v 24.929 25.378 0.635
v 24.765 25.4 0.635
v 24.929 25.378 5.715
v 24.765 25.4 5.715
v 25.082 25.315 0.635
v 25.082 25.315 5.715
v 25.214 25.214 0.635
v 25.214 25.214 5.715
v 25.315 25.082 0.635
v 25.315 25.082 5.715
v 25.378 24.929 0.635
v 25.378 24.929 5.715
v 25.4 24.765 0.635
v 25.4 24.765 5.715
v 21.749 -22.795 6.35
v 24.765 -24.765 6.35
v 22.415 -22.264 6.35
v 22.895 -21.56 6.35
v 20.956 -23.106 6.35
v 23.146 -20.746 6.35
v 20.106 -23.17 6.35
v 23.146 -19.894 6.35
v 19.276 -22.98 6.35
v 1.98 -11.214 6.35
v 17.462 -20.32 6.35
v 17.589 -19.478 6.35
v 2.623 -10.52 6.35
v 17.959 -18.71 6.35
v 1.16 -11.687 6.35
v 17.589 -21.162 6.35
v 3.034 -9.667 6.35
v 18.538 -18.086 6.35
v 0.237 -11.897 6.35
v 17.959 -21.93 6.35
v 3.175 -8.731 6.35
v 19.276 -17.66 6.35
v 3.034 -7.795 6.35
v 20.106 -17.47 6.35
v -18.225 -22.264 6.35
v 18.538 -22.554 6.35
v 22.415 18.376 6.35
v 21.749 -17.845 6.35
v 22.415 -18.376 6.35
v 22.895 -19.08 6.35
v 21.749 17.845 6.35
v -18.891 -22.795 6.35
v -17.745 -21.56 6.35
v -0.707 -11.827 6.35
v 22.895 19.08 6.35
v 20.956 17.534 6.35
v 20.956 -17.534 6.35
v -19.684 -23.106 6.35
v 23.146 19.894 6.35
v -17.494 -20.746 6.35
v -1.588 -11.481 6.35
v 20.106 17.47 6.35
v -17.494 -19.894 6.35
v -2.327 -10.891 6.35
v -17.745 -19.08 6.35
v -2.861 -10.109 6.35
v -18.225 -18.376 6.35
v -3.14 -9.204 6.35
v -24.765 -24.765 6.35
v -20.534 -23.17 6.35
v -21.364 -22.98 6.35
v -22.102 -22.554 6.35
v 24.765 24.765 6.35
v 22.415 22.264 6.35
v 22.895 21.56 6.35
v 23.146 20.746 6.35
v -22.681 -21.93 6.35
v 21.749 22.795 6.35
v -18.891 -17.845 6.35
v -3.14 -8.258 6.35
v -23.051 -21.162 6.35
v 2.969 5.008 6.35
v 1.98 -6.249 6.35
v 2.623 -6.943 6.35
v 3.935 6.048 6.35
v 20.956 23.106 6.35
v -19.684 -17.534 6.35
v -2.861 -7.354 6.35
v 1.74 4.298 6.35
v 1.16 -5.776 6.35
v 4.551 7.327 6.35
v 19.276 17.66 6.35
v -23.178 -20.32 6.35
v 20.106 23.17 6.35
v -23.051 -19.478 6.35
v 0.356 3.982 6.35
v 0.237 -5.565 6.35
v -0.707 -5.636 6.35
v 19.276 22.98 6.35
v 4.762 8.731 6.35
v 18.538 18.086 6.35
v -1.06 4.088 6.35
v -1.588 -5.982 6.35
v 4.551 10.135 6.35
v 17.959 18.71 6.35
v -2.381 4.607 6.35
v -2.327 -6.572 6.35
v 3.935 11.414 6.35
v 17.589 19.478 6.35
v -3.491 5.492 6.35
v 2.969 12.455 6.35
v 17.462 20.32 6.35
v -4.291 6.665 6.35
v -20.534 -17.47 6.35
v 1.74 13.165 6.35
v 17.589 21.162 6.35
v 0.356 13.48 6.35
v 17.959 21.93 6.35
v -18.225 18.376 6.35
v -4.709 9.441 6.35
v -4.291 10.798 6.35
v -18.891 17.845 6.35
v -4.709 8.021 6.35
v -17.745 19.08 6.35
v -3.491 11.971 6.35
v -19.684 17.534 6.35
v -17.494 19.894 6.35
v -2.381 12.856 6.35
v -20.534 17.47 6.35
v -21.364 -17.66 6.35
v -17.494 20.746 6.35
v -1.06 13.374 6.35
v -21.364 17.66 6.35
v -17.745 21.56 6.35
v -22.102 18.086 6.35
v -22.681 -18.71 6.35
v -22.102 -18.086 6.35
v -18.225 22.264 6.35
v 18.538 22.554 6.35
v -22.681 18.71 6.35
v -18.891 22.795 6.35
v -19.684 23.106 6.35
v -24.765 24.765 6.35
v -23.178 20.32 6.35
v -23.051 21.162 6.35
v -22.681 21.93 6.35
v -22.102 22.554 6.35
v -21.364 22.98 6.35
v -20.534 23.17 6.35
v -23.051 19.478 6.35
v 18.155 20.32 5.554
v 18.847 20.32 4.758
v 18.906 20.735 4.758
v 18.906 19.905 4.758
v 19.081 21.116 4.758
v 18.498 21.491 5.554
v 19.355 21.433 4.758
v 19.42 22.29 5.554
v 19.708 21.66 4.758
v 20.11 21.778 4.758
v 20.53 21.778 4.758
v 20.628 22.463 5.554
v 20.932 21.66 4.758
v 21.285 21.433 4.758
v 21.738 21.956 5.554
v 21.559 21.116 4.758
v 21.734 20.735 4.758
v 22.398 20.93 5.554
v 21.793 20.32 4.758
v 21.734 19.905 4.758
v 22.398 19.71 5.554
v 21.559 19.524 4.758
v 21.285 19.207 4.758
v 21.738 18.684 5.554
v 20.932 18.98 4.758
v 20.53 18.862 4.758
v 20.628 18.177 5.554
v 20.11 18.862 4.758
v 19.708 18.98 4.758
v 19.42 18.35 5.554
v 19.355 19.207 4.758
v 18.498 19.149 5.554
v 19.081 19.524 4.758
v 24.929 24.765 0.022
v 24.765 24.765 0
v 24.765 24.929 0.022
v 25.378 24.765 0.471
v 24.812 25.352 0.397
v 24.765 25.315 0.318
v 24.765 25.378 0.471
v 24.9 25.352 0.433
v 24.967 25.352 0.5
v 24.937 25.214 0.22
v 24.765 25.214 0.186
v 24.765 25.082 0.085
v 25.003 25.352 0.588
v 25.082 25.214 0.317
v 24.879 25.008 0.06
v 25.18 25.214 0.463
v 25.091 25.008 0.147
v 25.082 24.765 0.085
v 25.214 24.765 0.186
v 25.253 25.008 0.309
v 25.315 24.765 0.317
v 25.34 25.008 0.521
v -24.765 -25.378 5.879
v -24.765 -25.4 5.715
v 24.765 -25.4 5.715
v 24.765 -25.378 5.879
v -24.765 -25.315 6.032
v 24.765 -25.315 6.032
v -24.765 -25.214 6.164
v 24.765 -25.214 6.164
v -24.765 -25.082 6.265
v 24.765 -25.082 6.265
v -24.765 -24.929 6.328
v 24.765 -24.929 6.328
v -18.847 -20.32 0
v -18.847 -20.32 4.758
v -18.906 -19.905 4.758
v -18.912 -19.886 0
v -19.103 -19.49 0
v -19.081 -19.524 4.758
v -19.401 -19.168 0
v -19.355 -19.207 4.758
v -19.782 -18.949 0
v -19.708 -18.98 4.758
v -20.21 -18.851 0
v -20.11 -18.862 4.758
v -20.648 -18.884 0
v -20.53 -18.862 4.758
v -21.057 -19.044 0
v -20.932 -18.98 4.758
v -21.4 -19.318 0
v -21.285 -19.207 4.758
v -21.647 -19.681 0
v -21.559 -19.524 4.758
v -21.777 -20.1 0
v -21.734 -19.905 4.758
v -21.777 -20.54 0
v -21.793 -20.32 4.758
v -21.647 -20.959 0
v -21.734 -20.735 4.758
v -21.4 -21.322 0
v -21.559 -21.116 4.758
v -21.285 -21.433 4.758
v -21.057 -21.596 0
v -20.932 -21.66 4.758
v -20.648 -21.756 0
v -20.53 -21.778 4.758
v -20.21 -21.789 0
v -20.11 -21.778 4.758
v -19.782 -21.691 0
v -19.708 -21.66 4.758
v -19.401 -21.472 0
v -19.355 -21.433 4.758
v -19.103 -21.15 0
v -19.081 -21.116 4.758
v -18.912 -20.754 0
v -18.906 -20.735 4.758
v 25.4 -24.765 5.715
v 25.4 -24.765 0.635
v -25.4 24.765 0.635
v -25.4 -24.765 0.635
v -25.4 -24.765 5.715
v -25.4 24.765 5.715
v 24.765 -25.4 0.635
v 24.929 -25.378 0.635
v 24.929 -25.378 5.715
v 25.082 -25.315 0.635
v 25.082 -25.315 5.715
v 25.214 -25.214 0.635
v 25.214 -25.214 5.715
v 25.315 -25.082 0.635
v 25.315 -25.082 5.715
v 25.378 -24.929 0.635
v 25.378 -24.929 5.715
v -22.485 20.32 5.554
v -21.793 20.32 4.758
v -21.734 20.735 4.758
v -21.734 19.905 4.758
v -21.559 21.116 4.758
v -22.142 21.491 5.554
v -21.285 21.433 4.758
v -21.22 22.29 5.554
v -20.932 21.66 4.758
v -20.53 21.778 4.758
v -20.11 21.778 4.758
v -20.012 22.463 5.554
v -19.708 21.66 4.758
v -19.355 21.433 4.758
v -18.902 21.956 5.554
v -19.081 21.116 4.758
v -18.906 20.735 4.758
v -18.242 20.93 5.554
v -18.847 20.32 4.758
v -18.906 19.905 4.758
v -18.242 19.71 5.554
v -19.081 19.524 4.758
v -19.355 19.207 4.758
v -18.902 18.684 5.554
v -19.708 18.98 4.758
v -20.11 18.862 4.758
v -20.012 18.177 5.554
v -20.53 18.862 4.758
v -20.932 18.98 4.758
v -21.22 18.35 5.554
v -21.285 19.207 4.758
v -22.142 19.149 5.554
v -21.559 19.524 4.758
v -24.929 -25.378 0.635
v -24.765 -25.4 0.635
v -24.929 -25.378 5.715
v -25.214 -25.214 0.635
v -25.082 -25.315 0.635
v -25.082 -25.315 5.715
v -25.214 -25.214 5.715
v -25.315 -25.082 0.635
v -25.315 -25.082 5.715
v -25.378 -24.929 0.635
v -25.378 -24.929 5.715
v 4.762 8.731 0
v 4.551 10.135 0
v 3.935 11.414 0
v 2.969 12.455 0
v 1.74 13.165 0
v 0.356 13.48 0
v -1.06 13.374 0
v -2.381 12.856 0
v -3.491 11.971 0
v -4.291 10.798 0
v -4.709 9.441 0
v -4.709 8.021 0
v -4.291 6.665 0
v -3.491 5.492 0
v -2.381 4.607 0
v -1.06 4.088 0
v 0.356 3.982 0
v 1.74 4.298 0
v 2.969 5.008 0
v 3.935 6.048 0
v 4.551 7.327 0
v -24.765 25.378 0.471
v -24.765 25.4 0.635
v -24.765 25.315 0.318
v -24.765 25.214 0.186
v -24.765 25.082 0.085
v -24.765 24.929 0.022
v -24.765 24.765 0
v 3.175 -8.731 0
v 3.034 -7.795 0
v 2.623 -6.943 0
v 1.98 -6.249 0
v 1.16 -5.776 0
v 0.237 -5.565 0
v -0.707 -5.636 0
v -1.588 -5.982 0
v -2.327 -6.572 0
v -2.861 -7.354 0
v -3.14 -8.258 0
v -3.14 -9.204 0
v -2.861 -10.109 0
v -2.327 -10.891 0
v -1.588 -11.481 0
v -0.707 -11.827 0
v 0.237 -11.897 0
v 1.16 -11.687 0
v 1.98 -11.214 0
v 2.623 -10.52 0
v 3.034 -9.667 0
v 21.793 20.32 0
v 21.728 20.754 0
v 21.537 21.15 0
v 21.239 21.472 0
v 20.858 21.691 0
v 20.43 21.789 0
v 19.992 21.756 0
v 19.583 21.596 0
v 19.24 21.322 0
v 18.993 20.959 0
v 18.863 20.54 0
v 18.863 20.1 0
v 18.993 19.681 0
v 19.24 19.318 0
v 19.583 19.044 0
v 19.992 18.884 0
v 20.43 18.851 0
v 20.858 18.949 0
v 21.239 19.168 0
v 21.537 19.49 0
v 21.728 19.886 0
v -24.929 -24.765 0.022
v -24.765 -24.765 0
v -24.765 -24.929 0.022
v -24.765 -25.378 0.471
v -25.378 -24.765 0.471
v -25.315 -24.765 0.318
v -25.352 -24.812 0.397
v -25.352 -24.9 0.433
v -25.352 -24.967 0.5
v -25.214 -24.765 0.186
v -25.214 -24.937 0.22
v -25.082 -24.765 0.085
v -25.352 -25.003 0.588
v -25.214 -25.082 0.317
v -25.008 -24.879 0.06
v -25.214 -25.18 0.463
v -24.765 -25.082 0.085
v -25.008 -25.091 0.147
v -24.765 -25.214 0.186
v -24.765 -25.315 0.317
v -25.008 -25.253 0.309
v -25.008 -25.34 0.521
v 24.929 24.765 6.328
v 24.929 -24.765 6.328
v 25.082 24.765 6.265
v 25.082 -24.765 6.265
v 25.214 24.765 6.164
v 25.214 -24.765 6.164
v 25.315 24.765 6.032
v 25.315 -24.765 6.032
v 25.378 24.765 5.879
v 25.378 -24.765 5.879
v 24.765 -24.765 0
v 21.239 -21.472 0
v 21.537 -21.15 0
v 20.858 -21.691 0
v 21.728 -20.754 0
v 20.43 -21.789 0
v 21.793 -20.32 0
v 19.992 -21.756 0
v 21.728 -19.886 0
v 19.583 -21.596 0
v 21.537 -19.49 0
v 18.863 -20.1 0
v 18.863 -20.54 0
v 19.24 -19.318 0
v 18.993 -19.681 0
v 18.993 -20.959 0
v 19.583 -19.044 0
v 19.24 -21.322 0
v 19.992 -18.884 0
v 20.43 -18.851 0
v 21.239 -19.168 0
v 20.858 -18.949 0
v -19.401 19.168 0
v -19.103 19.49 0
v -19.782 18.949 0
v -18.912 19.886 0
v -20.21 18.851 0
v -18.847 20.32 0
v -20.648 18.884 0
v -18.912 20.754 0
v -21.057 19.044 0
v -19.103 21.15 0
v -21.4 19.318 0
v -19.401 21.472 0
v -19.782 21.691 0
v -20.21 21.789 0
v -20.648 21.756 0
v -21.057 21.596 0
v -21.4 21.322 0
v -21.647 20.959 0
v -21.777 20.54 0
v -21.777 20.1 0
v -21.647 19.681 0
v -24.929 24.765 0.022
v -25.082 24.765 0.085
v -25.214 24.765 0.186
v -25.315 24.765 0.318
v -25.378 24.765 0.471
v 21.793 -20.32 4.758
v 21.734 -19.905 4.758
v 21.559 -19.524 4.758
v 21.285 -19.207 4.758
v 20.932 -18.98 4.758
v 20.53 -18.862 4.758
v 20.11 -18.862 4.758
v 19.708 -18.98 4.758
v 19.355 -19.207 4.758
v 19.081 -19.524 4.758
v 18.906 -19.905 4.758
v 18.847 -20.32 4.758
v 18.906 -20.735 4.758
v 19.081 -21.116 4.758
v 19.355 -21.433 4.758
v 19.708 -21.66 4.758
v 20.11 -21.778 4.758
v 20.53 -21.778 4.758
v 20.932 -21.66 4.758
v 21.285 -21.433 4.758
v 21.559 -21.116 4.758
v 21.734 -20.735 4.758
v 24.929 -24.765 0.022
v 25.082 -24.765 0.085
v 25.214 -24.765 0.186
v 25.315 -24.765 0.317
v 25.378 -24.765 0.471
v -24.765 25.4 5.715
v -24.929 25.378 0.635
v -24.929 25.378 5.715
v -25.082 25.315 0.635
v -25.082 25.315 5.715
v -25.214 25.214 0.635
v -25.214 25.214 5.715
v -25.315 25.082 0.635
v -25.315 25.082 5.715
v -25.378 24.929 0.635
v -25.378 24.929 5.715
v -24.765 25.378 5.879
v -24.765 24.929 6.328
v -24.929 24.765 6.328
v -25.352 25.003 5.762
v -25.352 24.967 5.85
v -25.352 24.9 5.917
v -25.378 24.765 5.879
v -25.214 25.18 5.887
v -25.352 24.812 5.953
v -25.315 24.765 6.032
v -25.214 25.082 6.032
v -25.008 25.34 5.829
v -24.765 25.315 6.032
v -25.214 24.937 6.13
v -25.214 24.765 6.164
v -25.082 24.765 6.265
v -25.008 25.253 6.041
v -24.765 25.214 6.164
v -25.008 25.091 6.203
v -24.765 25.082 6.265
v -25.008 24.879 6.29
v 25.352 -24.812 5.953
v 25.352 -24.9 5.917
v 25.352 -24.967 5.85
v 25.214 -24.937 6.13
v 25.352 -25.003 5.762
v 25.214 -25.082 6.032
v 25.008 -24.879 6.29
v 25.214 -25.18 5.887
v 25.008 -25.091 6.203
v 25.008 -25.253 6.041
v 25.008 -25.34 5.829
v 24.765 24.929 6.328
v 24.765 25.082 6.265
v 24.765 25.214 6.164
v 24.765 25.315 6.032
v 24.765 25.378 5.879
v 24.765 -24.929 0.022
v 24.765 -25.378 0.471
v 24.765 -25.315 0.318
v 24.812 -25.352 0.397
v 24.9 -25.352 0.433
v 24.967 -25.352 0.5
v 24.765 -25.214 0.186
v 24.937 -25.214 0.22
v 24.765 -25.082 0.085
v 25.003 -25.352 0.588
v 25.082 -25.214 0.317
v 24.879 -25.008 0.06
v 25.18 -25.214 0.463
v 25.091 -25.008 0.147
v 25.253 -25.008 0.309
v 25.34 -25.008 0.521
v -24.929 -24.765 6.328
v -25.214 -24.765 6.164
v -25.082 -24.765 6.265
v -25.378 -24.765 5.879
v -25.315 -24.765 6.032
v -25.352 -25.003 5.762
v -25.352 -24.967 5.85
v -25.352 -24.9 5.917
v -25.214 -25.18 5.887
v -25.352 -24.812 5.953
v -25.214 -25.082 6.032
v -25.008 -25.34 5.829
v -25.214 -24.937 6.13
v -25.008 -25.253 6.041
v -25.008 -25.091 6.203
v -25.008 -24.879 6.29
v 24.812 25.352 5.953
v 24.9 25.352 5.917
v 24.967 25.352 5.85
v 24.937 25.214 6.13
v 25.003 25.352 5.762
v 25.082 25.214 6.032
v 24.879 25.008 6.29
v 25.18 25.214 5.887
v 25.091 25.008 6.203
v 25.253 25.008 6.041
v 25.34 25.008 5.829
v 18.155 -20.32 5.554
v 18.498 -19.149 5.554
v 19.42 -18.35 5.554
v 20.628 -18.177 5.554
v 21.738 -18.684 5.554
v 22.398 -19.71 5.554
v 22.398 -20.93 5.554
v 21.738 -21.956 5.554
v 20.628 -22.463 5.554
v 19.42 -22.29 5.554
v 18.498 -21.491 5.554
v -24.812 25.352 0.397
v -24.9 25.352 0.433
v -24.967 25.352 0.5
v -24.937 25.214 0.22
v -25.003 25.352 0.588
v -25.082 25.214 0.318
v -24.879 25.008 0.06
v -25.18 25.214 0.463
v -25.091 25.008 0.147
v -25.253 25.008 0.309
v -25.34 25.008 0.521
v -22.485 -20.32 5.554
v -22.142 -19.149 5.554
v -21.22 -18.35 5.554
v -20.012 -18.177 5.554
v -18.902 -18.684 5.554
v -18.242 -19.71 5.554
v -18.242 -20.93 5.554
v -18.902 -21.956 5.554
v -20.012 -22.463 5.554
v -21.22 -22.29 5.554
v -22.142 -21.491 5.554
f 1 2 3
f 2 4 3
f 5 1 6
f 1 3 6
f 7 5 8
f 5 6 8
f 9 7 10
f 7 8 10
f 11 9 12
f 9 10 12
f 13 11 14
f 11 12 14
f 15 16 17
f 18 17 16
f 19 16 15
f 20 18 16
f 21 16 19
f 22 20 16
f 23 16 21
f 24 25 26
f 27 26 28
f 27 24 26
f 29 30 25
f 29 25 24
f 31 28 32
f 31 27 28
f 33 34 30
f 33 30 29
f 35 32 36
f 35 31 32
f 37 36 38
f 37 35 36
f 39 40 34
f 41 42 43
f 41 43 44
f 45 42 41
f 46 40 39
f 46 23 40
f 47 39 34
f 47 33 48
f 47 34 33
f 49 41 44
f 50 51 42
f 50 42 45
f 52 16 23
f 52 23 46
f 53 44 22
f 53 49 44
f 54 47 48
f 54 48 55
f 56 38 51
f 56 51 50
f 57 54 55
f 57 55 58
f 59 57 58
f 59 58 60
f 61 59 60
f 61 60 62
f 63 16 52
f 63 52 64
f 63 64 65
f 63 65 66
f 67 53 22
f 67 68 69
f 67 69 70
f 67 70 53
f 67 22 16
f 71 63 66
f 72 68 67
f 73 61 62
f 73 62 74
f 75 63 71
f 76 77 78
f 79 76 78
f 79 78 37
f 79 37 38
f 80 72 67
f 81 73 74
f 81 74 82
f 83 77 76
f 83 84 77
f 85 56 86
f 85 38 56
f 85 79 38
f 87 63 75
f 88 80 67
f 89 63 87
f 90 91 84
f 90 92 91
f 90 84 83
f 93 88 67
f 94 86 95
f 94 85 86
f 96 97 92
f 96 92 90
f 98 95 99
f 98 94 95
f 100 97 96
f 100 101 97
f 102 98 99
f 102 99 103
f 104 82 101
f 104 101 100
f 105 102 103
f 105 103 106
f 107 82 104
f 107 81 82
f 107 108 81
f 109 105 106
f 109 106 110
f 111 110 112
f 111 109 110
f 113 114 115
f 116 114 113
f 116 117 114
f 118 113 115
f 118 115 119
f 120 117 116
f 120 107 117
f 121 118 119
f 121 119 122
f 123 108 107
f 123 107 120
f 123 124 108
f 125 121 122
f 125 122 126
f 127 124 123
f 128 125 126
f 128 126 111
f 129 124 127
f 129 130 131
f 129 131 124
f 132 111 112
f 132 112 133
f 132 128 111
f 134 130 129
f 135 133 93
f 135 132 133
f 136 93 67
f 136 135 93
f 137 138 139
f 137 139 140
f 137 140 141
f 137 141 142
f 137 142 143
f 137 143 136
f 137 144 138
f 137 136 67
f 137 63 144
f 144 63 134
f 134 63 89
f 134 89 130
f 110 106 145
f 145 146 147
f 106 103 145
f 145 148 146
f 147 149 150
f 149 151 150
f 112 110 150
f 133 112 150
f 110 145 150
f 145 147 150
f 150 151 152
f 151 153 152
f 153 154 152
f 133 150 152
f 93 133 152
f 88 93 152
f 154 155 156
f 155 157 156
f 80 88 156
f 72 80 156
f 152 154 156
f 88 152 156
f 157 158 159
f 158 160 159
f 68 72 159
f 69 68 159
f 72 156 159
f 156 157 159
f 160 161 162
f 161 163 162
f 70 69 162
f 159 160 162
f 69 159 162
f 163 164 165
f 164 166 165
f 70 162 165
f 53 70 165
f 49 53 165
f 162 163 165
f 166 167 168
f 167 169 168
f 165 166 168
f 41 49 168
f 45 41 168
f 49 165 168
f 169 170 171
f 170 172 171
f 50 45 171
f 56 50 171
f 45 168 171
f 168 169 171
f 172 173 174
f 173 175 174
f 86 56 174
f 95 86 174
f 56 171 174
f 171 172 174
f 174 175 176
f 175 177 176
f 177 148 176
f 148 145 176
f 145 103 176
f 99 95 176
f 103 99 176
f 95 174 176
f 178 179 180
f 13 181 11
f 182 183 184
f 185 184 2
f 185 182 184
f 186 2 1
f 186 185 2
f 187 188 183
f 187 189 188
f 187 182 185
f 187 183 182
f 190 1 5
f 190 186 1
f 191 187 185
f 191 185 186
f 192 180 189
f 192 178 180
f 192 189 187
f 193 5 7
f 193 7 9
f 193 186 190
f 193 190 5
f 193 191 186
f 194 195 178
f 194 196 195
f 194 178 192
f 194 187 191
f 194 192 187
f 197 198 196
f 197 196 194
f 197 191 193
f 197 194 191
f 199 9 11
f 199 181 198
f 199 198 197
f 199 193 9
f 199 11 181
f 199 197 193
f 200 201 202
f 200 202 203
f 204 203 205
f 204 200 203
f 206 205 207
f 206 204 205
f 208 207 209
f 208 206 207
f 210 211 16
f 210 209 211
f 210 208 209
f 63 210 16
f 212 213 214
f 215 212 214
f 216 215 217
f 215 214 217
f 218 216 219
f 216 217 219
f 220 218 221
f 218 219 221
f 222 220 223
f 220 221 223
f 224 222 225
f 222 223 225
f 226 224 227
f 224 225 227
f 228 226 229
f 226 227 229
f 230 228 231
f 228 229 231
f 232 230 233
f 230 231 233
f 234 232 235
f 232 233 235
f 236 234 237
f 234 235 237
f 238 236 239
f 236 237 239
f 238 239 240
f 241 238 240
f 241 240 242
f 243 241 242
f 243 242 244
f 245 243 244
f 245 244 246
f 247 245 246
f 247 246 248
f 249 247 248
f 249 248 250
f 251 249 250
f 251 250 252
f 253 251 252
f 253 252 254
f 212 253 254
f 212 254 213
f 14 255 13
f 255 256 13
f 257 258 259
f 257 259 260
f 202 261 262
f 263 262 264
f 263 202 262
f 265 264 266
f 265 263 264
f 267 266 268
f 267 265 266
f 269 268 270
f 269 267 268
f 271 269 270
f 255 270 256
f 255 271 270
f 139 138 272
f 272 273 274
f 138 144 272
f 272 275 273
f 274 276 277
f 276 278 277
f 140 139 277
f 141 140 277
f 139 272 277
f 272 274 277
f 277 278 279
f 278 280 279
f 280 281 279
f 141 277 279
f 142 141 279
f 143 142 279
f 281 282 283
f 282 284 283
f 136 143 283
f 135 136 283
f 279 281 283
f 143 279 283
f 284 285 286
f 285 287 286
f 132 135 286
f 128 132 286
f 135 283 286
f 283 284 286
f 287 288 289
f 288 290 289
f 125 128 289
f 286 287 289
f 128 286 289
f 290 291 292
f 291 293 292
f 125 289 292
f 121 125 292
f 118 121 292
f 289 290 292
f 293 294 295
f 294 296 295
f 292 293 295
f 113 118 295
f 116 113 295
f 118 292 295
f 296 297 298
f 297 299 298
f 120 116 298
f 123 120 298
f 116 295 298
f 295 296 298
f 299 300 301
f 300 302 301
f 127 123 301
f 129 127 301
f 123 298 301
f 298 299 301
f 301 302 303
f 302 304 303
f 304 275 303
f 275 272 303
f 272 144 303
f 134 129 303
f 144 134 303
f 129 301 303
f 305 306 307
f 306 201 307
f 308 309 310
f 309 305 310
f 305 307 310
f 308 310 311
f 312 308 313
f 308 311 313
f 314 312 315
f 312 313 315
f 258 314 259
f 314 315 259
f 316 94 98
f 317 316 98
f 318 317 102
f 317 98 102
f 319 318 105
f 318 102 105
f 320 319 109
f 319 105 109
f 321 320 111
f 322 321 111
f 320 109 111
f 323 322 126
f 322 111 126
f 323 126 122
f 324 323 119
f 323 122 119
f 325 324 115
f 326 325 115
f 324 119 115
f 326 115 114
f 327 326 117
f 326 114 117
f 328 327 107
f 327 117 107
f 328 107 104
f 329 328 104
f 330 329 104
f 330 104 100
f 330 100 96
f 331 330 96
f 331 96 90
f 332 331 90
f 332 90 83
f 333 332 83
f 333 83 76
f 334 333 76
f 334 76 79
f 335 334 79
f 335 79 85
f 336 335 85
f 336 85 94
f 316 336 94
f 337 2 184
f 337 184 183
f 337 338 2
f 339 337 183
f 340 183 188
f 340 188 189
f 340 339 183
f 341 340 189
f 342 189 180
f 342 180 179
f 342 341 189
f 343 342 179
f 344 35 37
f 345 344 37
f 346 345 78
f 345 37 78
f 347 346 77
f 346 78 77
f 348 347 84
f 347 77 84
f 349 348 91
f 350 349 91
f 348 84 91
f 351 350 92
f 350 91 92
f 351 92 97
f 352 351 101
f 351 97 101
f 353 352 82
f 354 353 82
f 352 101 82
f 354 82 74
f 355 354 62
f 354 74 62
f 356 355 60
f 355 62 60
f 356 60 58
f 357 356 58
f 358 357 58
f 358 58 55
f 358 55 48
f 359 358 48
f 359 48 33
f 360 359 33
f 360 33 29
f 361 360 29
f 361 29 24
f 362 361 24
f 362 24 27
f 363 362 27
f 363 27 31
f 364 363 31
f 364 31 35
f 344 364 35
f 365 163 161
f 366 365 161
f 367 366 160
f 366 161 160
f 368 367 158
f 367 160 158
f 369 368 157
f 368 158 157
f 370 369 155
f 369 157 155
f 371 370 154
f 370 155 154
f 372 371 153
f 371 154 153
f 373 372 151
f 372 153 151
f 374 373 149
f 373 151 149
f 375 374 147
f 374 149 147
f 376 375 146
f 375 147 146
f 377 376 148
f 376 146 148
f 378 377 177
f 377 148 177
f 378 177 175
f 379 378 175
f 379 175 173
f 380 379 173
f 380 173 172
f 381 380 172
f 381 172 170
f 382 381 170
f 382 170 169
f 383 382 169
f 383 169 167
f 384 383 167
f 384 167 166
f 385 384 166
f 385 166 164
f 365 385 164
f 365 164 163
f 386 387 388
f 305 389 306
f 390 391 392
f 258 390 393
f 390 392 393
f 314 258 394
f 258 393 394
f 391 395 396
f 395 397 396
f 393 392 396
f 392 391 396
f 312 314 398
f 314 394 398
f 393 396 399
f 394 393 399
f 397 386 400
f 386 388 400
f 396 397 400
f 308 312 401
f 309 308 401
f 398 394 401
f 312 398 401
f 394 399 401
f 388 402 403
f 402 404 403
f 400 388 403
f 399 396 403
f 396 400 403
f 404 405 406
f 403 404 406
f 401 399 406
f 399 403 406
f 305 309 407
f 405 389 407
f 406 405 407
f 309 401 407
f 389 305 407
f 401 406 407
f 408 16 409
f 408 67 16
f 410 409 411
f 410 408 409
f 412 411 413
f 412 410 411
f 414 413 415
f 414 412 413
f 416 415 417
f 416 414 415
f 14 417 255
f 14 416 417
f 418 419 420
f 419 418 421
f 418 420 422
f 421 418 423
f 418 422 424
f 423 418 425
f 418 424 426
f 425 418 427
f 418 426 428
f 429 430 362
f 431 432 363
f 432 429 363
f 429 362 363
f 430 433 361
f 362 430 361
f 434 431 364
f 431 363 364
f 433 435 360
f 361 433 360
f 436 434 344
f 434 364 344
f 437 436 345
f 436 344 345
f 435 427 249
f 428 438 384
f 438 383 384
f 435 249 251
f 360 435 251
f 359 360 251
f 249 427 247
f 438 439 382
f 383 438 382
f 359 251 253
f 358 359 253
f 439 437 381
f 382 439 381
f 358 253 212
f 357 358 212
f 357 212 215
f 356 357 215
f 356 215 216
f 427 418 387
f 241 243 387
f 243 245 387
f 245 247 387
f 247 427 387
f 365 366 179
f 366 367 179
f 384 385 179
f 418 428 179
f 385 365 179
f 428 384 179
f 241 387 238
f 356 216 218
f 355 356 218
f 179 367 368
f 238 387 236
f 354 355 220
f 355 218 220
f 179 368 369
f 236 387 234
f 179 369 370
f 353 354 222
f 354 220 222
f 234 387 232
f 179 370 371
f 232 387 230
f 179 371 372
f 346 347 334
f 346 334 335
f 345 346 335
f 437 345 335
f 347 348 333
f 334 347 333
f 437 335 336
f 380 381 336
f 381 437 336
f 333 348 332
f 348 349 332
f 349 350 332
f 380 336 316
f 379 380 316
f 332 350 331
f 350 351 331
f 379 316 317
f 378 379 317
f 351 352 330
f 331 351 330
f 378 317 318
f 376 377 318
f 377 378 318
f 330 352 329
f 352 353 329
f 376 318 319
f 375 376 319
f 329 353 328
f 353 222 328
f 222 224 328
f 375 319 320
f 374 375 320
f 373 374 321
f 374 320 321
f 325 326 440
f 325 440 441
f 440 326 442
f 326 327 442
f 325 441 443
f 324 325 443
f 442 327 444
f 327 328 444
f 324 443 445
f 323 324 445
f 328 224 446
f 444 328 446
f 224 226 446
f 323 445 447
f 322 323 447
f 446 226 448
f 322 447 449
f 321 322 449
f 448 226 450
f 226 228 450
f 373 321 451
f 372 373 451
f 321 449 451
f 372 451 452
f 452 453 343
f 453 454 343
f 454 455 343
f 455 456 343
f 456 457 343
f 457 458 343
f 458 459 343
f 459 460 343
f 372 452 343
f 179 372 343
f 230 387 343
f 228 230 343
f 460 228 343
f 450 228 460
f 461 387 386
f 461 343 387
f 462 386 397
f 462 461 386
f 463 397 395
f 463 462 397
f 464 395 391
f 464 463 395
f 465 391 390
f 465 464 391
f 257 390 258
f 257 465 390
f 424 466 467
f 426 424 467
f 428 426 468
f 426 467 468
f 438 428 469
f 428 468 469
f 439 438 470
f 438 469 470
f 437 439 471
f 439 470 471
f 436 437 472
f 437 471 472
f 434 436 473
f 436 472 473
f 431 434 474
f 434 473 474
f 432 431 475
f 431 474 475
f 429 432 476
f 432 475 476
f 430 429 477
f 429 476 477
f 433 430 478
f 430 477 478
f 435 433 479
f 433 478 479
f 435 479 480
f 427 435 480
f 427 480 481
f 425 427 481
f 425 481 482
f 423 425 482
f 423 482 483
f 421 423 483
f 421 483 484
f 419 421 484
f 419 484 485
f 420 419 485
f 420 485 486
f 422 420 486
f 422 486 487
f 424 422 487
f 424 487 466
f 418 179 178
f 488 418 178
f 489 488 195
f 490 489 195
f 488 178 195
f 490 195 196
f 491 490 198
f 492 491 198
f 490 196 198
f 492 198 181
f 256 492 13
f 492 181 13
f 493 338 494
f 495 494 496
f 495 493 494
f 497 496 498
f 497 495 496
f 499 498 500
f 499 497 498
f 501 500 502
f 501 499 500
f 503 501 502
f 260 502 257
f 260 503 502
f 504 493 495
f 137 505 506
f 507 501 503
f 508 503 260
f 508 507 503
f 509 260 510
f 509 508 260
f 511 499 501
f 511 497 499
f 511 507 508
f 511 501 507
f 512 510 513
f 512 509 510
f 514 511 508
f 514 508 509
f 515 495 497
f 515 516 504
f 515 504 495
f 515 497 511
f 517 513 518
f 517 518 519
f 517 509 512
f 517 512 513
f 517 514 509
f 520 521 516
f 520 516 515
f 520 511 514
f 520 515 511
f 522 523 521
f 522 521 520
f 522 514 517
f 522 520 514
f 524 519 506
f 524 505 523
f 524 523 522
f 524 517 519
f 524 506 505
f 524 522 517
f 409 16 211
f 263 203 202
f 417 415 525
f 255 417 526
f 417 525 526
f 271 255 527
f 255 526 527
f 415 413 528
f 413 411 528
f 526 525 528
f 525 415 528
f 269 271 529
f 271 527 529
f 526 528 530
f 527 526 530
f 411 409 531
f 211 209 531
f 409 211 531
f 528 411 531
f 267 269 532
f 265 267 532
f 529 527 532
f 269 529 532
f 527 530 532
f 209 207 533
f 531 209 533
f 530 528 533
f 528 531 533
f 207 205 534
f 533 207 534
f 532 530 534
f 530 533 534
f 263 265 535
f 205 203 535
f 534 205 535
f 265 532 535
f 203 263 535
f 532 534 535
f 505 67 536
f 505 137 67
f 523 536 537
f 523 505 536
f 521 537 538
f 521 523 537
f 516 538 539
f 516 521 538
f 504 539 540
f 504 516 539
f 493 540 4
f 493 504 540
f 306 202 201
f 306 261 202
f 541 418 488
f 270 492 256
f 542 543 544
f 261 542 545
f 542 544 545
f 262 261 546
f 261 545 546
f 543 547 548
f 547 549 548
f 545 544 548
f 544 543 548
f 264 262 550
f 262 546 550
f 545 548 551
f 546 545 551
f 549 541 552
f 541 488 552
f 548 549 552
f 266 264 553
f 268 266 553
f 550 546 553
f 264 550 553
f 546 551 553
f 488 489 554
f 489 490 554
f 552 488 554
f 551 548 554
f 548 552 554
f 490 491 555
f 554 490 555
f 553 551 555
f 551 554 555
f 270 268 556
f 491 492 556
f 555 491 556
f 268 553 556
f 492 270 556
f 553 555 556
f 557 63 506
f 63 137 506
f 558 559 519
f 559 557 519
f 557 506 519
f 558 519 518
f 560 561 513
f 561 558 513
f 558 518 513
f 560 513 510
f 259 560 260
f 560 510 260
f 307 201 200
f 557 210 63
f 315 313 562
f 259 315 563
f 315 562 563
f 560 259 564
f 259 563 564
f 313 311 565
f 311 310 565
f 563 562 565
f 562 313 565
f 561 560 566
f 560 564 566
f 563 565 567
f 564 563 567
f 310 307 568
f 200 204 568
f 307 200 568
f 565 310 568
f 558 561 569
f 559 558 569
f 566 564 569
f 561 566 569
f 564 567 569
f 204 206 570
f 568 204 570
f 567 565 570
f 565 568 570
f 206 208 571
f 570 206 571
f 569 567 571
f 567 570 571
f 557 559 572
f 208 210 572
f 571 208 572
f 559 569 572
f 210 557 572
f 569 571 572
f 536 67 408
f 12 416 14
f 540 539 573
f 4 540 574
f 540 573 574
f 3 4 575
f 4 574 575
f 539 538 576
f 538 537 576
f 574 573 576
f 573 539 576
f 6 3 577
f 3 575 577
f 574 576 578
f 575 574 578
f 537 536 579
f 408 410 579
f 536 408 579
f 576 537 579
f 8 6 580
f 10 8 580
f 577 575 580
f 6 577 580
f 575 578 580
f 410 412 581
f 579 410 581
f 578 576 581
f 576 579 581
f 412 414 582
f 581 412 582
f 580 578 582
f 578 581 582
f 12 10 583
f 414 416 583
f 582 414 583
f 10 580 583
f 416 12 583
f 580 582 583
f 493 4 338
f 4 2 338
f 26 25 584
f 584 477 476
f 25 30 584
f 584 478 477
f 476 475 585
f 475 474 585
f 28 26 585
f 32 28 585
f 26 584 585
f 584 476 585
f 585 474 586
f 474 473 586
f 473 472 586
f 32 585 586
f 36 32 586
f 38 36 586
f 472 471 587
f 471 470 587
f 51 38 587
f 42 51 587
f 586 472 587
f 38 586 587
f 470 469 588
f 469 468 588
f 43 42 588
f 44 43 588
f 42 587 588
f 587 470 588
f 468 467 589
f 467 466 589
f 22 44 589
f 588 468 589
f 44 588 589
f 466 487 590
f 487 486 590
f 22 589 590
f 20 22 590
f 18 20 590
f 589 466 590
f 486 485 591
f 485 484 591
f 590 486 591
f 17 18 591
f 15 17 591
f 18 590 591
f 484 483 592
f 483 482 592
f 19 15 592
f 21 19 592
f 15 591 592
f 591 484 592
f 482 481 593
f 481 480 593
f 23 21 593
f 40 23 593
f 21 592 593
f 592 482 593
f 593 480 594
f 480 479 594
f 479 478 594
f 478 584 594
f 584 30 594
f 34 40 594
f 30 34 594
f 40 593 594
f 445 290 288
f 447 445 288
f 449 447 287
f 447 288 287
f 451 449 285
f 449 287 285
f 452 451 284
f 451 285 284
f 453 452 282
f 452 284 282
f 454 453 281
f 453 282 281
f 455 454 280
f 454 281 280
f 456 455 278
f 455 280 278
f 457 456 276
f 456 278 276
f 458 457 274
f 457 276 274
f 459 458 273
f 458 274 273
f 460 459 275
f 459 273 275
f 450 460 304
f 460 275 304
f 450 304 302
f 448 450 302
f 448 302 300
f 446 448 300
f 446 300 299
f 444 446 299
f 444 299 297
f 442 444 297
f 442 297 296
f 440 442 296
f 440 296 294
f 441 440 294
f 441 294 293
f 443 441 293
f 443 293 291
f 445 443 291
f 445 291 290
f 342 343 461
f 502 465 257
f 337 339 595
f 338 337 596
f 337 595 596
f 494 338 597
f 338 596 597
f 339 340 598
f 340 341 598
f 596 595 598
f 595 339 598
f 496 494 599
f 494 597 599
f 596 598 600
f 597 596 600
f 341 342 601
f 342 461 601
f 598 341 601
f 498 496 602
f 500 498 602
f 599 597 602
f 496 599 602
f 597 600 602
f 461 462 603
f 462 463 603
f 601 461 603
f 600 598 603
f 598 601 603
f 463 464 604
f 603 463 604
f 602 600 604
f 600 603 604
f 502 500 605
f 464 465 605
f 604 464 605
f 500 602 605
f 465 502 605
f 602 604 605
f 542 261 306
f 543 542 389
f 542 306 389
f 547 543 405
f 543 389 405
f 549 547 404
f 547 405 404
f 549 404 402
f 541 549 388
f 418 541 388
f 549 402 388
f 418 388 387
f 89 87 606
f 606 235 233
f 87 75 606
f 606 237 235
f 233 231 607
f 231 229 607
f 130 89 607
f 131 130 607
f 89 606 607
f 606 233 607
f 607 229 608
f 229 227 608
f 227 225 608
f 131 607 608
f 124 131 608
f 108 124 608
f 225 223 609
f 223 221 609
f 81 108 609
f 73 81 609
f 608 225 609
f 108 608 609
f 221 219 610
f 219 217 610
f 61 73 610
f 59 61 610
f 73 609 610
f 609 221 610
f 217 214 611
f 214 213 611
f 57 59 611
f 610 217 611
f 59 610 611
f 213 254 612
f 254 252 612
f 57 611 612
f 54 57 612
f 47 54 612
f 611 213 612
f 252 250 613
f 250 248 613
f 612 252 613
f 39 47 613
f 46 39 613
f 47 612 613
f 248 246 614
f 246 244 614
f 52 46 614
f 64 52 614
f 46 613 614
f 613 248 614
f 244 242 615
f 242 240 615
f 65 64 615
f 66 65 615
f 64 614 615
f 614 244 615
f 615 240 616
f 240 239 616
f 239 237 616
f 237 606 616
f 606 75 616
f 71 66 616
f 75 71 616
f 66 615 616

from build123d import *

# Parameters (mm, degrees)
SKETCH1_W                                      = 50.8
SKETCH1_H                                      = 50.8
BOSS_EXTRUDE1_DEPTH                            = 6.35
CUT_EXTRUDE1_REACH                             = 38.478
SKETCH2_R                                      = 4.7625
SKETCH2_R_2                                    = 3.175
CUT_EXTRUDE2_REACH                             = 38.478
SKETCH5_R                                      = 1.4732
CSK_FOR_4_FLAT_HEAD_MACHINE_SCREW1_D           = 2.9464
CSK_FOR_4_FLAT_HEAD_MACHINE_SCREW1_CSINK_D     = 5.715
CSK_FOR_4_FLAT_HEAD_MACHINE_SCREW1_CSINK_ANGLE = 82
FILLET1_R                                      = 0.635


with BuildPart() as part:
    # Sketch1 → Boss-Extrude1 (new body)
    with BuildSketch(Plane(origin=(0, 0, 0), x_dir=(0, 1, 0), z_dir=(0, 0, 1))):
        Rectangle(SKETCH1_W, SKETCH1_H)
    extrude(amount=BOSS_EXTRUDE1_DEPTH)

    # Sketch2 → Cut-Extrude1 (cut, up to next)
    with BuildSketch(Plane.XY.offset(6.35), mode=Mode.PRIVATE) as cut_extrude1_sk1:
        with Locations((0, 8.73125)):
            Circle(SKETCH2_R)
    cut_extrude1_tool1 = extrude(cut_extrude1_sk1.sketch, amount=-CUT_EXTRUDE1_REACH, mode=Mode.PRIVATE) & part.part
    # Sketch2 → Cut-Extrude1 (cut, up to next)
    with BuildSketch(Plane.XY.offset(6.35), mode=Mode.PRIVATE) as cut_extrude1_sk2:
        with Locations((0, -8.73125)):
            Circle(SKETCH2_R_2)
    cut_extrude1_tool2 = extrude(cut_extrude1_sk2.sketch, amount=-CUT_EXTRUDE1_REACH, mode=Mode.PRIVATE) & part.part
    add(cut_extrude1_tool1.solids().sort_by_distance((0, 8.73125, 6.35))[0], mode=Mode.SUBTRACT)
    add(cut_extrude1_tool2.solids().sort_by_distance((0, -8.73125, 6.35))[0], mode=Mode.SUBTRACT)

    # Sketch5 → Cut-Extrude2 (cut, up to next)
    with BuildSketch(Plane.XY.offset(6.35), mode=Mode.PRIVATE) as cut_extrude2_sk1:
        with Locations((-20.32, 20.32)):
            Circle(SKETCH5_R)
    cut_extrude2_tool1 = extrude(cut_extrude2_sk1.sketch, amount=-CUT_EXTRUDE2_REACH, mode=Mode.PRIVATE) & part.part
    # Sketch5 → Cut-Extrude2 (cut, up to next)
    with BuildSketch(Plane.XY.offset(6.35), mode=Mode.PRIVATE) as cut_extrude2_sk2:
        with Locations((20.32, 20.32)):
            Circle(SKETCH5_R)
    cut_extrude2_tool2 = extrude(cut_extrude2_sk2.sketch, amount=-CUT_EXTRUDE2_REACH, mode=Mode.PRIVATE) & part.part
    # Sketch5 → Cut-Extrude2 (cut, up to next)
    with BuildSketch(Plane.XY.offset(6.35), mode=Mode.PRIVATE) as cut_extrude2_sk3:
        with Locations((-20.32, -20.32)):
            Circle(SKETCH5_R)
    cut_extrude2_tool3 = extrude(cut_extrude2_sk3.sketch, amount=-CUT_EXTRUDE2_REACH, mode=Mode.PRIVATE) & part.part
    # Sketch5 → Cut-Extrude2 (cut, up to next)
    with BuildSketch(Plane.XY.offset(6.35), mode=Mode.PRIVATE) as cut_extrude2_sk4:
        with Locations((20.32, -20.32)):
            Circle(SKETCH5_R)
    cut_extrude2_tool4 = extrude(cut_extrude2_sk4.sketch, amount=-CUT_EXTRUDE2_REACH, mode=Mode.PRIVATE) & part.part
    add(cut_extrude2_tool1.solids().sort_by_distance((-20.32, 20.32, 6.35))[0], mode=Mode.SUBTRACT)
    add(cut_extrude2_tool2.solids().sort_by_distance((20.32, 20.32, 6.35))[0], mode=Mode.SUBTRACT)
    add(cut_extrude2_tool3.solids().sort_by_distance((-20.32, -20.32, 6.35))[0], mode=Mode.SUBTRACT)
    add(cut_extrude2_tool4.solids().sort_by_distance((20.32, -20.32, 6.35))[0], mode=Mode.SUBTRACT)

    # CSK for #4 Flat Head Machine Screw1 (through all)
    with Locations(Plane.XY.offset(6.35)):
        with Locations((-20.32, 20.32), (20.32, 20.32), (20.32, -20.32), (-20.32, -20.32)):
            CounterSinkHole(CSK_FOR_4_FLAT_HEAD_MACHINE_SCREW1_D / 2, CSK_FOR_4_FLAT_HEAD_MACHINE_SCREW1_CSINK_D / 2, counter_sink_angle=CSK_FOR_4_FLAT_HEAD_MACHINE_SCREW1_CSINK_ANGLE)

    # Fillet1
    fillet1_edges = [part.edges().sort_by_distance(p)[0] for p in [
        (0, -25.4, 6.35),
        (25.4, 0, 6.35),
        (0, 25.4, 6.35),
        (25.4, 0, 0),
        (0, -25.4, 0),
        (-25.4, 0, 0),
        (0, 25.4, 0),
        (25.4, 25.4, 3.175),
        (25.4, -25.4, 3.175),
        (-25.4, -25.4, 3.175),
        (-25.4, 25.4, 3.175),
        (-25.4, 0, 6.35),
    ]]
    fillet(fillet1_edges, radius=FILLET1_R)


solid = part.part
